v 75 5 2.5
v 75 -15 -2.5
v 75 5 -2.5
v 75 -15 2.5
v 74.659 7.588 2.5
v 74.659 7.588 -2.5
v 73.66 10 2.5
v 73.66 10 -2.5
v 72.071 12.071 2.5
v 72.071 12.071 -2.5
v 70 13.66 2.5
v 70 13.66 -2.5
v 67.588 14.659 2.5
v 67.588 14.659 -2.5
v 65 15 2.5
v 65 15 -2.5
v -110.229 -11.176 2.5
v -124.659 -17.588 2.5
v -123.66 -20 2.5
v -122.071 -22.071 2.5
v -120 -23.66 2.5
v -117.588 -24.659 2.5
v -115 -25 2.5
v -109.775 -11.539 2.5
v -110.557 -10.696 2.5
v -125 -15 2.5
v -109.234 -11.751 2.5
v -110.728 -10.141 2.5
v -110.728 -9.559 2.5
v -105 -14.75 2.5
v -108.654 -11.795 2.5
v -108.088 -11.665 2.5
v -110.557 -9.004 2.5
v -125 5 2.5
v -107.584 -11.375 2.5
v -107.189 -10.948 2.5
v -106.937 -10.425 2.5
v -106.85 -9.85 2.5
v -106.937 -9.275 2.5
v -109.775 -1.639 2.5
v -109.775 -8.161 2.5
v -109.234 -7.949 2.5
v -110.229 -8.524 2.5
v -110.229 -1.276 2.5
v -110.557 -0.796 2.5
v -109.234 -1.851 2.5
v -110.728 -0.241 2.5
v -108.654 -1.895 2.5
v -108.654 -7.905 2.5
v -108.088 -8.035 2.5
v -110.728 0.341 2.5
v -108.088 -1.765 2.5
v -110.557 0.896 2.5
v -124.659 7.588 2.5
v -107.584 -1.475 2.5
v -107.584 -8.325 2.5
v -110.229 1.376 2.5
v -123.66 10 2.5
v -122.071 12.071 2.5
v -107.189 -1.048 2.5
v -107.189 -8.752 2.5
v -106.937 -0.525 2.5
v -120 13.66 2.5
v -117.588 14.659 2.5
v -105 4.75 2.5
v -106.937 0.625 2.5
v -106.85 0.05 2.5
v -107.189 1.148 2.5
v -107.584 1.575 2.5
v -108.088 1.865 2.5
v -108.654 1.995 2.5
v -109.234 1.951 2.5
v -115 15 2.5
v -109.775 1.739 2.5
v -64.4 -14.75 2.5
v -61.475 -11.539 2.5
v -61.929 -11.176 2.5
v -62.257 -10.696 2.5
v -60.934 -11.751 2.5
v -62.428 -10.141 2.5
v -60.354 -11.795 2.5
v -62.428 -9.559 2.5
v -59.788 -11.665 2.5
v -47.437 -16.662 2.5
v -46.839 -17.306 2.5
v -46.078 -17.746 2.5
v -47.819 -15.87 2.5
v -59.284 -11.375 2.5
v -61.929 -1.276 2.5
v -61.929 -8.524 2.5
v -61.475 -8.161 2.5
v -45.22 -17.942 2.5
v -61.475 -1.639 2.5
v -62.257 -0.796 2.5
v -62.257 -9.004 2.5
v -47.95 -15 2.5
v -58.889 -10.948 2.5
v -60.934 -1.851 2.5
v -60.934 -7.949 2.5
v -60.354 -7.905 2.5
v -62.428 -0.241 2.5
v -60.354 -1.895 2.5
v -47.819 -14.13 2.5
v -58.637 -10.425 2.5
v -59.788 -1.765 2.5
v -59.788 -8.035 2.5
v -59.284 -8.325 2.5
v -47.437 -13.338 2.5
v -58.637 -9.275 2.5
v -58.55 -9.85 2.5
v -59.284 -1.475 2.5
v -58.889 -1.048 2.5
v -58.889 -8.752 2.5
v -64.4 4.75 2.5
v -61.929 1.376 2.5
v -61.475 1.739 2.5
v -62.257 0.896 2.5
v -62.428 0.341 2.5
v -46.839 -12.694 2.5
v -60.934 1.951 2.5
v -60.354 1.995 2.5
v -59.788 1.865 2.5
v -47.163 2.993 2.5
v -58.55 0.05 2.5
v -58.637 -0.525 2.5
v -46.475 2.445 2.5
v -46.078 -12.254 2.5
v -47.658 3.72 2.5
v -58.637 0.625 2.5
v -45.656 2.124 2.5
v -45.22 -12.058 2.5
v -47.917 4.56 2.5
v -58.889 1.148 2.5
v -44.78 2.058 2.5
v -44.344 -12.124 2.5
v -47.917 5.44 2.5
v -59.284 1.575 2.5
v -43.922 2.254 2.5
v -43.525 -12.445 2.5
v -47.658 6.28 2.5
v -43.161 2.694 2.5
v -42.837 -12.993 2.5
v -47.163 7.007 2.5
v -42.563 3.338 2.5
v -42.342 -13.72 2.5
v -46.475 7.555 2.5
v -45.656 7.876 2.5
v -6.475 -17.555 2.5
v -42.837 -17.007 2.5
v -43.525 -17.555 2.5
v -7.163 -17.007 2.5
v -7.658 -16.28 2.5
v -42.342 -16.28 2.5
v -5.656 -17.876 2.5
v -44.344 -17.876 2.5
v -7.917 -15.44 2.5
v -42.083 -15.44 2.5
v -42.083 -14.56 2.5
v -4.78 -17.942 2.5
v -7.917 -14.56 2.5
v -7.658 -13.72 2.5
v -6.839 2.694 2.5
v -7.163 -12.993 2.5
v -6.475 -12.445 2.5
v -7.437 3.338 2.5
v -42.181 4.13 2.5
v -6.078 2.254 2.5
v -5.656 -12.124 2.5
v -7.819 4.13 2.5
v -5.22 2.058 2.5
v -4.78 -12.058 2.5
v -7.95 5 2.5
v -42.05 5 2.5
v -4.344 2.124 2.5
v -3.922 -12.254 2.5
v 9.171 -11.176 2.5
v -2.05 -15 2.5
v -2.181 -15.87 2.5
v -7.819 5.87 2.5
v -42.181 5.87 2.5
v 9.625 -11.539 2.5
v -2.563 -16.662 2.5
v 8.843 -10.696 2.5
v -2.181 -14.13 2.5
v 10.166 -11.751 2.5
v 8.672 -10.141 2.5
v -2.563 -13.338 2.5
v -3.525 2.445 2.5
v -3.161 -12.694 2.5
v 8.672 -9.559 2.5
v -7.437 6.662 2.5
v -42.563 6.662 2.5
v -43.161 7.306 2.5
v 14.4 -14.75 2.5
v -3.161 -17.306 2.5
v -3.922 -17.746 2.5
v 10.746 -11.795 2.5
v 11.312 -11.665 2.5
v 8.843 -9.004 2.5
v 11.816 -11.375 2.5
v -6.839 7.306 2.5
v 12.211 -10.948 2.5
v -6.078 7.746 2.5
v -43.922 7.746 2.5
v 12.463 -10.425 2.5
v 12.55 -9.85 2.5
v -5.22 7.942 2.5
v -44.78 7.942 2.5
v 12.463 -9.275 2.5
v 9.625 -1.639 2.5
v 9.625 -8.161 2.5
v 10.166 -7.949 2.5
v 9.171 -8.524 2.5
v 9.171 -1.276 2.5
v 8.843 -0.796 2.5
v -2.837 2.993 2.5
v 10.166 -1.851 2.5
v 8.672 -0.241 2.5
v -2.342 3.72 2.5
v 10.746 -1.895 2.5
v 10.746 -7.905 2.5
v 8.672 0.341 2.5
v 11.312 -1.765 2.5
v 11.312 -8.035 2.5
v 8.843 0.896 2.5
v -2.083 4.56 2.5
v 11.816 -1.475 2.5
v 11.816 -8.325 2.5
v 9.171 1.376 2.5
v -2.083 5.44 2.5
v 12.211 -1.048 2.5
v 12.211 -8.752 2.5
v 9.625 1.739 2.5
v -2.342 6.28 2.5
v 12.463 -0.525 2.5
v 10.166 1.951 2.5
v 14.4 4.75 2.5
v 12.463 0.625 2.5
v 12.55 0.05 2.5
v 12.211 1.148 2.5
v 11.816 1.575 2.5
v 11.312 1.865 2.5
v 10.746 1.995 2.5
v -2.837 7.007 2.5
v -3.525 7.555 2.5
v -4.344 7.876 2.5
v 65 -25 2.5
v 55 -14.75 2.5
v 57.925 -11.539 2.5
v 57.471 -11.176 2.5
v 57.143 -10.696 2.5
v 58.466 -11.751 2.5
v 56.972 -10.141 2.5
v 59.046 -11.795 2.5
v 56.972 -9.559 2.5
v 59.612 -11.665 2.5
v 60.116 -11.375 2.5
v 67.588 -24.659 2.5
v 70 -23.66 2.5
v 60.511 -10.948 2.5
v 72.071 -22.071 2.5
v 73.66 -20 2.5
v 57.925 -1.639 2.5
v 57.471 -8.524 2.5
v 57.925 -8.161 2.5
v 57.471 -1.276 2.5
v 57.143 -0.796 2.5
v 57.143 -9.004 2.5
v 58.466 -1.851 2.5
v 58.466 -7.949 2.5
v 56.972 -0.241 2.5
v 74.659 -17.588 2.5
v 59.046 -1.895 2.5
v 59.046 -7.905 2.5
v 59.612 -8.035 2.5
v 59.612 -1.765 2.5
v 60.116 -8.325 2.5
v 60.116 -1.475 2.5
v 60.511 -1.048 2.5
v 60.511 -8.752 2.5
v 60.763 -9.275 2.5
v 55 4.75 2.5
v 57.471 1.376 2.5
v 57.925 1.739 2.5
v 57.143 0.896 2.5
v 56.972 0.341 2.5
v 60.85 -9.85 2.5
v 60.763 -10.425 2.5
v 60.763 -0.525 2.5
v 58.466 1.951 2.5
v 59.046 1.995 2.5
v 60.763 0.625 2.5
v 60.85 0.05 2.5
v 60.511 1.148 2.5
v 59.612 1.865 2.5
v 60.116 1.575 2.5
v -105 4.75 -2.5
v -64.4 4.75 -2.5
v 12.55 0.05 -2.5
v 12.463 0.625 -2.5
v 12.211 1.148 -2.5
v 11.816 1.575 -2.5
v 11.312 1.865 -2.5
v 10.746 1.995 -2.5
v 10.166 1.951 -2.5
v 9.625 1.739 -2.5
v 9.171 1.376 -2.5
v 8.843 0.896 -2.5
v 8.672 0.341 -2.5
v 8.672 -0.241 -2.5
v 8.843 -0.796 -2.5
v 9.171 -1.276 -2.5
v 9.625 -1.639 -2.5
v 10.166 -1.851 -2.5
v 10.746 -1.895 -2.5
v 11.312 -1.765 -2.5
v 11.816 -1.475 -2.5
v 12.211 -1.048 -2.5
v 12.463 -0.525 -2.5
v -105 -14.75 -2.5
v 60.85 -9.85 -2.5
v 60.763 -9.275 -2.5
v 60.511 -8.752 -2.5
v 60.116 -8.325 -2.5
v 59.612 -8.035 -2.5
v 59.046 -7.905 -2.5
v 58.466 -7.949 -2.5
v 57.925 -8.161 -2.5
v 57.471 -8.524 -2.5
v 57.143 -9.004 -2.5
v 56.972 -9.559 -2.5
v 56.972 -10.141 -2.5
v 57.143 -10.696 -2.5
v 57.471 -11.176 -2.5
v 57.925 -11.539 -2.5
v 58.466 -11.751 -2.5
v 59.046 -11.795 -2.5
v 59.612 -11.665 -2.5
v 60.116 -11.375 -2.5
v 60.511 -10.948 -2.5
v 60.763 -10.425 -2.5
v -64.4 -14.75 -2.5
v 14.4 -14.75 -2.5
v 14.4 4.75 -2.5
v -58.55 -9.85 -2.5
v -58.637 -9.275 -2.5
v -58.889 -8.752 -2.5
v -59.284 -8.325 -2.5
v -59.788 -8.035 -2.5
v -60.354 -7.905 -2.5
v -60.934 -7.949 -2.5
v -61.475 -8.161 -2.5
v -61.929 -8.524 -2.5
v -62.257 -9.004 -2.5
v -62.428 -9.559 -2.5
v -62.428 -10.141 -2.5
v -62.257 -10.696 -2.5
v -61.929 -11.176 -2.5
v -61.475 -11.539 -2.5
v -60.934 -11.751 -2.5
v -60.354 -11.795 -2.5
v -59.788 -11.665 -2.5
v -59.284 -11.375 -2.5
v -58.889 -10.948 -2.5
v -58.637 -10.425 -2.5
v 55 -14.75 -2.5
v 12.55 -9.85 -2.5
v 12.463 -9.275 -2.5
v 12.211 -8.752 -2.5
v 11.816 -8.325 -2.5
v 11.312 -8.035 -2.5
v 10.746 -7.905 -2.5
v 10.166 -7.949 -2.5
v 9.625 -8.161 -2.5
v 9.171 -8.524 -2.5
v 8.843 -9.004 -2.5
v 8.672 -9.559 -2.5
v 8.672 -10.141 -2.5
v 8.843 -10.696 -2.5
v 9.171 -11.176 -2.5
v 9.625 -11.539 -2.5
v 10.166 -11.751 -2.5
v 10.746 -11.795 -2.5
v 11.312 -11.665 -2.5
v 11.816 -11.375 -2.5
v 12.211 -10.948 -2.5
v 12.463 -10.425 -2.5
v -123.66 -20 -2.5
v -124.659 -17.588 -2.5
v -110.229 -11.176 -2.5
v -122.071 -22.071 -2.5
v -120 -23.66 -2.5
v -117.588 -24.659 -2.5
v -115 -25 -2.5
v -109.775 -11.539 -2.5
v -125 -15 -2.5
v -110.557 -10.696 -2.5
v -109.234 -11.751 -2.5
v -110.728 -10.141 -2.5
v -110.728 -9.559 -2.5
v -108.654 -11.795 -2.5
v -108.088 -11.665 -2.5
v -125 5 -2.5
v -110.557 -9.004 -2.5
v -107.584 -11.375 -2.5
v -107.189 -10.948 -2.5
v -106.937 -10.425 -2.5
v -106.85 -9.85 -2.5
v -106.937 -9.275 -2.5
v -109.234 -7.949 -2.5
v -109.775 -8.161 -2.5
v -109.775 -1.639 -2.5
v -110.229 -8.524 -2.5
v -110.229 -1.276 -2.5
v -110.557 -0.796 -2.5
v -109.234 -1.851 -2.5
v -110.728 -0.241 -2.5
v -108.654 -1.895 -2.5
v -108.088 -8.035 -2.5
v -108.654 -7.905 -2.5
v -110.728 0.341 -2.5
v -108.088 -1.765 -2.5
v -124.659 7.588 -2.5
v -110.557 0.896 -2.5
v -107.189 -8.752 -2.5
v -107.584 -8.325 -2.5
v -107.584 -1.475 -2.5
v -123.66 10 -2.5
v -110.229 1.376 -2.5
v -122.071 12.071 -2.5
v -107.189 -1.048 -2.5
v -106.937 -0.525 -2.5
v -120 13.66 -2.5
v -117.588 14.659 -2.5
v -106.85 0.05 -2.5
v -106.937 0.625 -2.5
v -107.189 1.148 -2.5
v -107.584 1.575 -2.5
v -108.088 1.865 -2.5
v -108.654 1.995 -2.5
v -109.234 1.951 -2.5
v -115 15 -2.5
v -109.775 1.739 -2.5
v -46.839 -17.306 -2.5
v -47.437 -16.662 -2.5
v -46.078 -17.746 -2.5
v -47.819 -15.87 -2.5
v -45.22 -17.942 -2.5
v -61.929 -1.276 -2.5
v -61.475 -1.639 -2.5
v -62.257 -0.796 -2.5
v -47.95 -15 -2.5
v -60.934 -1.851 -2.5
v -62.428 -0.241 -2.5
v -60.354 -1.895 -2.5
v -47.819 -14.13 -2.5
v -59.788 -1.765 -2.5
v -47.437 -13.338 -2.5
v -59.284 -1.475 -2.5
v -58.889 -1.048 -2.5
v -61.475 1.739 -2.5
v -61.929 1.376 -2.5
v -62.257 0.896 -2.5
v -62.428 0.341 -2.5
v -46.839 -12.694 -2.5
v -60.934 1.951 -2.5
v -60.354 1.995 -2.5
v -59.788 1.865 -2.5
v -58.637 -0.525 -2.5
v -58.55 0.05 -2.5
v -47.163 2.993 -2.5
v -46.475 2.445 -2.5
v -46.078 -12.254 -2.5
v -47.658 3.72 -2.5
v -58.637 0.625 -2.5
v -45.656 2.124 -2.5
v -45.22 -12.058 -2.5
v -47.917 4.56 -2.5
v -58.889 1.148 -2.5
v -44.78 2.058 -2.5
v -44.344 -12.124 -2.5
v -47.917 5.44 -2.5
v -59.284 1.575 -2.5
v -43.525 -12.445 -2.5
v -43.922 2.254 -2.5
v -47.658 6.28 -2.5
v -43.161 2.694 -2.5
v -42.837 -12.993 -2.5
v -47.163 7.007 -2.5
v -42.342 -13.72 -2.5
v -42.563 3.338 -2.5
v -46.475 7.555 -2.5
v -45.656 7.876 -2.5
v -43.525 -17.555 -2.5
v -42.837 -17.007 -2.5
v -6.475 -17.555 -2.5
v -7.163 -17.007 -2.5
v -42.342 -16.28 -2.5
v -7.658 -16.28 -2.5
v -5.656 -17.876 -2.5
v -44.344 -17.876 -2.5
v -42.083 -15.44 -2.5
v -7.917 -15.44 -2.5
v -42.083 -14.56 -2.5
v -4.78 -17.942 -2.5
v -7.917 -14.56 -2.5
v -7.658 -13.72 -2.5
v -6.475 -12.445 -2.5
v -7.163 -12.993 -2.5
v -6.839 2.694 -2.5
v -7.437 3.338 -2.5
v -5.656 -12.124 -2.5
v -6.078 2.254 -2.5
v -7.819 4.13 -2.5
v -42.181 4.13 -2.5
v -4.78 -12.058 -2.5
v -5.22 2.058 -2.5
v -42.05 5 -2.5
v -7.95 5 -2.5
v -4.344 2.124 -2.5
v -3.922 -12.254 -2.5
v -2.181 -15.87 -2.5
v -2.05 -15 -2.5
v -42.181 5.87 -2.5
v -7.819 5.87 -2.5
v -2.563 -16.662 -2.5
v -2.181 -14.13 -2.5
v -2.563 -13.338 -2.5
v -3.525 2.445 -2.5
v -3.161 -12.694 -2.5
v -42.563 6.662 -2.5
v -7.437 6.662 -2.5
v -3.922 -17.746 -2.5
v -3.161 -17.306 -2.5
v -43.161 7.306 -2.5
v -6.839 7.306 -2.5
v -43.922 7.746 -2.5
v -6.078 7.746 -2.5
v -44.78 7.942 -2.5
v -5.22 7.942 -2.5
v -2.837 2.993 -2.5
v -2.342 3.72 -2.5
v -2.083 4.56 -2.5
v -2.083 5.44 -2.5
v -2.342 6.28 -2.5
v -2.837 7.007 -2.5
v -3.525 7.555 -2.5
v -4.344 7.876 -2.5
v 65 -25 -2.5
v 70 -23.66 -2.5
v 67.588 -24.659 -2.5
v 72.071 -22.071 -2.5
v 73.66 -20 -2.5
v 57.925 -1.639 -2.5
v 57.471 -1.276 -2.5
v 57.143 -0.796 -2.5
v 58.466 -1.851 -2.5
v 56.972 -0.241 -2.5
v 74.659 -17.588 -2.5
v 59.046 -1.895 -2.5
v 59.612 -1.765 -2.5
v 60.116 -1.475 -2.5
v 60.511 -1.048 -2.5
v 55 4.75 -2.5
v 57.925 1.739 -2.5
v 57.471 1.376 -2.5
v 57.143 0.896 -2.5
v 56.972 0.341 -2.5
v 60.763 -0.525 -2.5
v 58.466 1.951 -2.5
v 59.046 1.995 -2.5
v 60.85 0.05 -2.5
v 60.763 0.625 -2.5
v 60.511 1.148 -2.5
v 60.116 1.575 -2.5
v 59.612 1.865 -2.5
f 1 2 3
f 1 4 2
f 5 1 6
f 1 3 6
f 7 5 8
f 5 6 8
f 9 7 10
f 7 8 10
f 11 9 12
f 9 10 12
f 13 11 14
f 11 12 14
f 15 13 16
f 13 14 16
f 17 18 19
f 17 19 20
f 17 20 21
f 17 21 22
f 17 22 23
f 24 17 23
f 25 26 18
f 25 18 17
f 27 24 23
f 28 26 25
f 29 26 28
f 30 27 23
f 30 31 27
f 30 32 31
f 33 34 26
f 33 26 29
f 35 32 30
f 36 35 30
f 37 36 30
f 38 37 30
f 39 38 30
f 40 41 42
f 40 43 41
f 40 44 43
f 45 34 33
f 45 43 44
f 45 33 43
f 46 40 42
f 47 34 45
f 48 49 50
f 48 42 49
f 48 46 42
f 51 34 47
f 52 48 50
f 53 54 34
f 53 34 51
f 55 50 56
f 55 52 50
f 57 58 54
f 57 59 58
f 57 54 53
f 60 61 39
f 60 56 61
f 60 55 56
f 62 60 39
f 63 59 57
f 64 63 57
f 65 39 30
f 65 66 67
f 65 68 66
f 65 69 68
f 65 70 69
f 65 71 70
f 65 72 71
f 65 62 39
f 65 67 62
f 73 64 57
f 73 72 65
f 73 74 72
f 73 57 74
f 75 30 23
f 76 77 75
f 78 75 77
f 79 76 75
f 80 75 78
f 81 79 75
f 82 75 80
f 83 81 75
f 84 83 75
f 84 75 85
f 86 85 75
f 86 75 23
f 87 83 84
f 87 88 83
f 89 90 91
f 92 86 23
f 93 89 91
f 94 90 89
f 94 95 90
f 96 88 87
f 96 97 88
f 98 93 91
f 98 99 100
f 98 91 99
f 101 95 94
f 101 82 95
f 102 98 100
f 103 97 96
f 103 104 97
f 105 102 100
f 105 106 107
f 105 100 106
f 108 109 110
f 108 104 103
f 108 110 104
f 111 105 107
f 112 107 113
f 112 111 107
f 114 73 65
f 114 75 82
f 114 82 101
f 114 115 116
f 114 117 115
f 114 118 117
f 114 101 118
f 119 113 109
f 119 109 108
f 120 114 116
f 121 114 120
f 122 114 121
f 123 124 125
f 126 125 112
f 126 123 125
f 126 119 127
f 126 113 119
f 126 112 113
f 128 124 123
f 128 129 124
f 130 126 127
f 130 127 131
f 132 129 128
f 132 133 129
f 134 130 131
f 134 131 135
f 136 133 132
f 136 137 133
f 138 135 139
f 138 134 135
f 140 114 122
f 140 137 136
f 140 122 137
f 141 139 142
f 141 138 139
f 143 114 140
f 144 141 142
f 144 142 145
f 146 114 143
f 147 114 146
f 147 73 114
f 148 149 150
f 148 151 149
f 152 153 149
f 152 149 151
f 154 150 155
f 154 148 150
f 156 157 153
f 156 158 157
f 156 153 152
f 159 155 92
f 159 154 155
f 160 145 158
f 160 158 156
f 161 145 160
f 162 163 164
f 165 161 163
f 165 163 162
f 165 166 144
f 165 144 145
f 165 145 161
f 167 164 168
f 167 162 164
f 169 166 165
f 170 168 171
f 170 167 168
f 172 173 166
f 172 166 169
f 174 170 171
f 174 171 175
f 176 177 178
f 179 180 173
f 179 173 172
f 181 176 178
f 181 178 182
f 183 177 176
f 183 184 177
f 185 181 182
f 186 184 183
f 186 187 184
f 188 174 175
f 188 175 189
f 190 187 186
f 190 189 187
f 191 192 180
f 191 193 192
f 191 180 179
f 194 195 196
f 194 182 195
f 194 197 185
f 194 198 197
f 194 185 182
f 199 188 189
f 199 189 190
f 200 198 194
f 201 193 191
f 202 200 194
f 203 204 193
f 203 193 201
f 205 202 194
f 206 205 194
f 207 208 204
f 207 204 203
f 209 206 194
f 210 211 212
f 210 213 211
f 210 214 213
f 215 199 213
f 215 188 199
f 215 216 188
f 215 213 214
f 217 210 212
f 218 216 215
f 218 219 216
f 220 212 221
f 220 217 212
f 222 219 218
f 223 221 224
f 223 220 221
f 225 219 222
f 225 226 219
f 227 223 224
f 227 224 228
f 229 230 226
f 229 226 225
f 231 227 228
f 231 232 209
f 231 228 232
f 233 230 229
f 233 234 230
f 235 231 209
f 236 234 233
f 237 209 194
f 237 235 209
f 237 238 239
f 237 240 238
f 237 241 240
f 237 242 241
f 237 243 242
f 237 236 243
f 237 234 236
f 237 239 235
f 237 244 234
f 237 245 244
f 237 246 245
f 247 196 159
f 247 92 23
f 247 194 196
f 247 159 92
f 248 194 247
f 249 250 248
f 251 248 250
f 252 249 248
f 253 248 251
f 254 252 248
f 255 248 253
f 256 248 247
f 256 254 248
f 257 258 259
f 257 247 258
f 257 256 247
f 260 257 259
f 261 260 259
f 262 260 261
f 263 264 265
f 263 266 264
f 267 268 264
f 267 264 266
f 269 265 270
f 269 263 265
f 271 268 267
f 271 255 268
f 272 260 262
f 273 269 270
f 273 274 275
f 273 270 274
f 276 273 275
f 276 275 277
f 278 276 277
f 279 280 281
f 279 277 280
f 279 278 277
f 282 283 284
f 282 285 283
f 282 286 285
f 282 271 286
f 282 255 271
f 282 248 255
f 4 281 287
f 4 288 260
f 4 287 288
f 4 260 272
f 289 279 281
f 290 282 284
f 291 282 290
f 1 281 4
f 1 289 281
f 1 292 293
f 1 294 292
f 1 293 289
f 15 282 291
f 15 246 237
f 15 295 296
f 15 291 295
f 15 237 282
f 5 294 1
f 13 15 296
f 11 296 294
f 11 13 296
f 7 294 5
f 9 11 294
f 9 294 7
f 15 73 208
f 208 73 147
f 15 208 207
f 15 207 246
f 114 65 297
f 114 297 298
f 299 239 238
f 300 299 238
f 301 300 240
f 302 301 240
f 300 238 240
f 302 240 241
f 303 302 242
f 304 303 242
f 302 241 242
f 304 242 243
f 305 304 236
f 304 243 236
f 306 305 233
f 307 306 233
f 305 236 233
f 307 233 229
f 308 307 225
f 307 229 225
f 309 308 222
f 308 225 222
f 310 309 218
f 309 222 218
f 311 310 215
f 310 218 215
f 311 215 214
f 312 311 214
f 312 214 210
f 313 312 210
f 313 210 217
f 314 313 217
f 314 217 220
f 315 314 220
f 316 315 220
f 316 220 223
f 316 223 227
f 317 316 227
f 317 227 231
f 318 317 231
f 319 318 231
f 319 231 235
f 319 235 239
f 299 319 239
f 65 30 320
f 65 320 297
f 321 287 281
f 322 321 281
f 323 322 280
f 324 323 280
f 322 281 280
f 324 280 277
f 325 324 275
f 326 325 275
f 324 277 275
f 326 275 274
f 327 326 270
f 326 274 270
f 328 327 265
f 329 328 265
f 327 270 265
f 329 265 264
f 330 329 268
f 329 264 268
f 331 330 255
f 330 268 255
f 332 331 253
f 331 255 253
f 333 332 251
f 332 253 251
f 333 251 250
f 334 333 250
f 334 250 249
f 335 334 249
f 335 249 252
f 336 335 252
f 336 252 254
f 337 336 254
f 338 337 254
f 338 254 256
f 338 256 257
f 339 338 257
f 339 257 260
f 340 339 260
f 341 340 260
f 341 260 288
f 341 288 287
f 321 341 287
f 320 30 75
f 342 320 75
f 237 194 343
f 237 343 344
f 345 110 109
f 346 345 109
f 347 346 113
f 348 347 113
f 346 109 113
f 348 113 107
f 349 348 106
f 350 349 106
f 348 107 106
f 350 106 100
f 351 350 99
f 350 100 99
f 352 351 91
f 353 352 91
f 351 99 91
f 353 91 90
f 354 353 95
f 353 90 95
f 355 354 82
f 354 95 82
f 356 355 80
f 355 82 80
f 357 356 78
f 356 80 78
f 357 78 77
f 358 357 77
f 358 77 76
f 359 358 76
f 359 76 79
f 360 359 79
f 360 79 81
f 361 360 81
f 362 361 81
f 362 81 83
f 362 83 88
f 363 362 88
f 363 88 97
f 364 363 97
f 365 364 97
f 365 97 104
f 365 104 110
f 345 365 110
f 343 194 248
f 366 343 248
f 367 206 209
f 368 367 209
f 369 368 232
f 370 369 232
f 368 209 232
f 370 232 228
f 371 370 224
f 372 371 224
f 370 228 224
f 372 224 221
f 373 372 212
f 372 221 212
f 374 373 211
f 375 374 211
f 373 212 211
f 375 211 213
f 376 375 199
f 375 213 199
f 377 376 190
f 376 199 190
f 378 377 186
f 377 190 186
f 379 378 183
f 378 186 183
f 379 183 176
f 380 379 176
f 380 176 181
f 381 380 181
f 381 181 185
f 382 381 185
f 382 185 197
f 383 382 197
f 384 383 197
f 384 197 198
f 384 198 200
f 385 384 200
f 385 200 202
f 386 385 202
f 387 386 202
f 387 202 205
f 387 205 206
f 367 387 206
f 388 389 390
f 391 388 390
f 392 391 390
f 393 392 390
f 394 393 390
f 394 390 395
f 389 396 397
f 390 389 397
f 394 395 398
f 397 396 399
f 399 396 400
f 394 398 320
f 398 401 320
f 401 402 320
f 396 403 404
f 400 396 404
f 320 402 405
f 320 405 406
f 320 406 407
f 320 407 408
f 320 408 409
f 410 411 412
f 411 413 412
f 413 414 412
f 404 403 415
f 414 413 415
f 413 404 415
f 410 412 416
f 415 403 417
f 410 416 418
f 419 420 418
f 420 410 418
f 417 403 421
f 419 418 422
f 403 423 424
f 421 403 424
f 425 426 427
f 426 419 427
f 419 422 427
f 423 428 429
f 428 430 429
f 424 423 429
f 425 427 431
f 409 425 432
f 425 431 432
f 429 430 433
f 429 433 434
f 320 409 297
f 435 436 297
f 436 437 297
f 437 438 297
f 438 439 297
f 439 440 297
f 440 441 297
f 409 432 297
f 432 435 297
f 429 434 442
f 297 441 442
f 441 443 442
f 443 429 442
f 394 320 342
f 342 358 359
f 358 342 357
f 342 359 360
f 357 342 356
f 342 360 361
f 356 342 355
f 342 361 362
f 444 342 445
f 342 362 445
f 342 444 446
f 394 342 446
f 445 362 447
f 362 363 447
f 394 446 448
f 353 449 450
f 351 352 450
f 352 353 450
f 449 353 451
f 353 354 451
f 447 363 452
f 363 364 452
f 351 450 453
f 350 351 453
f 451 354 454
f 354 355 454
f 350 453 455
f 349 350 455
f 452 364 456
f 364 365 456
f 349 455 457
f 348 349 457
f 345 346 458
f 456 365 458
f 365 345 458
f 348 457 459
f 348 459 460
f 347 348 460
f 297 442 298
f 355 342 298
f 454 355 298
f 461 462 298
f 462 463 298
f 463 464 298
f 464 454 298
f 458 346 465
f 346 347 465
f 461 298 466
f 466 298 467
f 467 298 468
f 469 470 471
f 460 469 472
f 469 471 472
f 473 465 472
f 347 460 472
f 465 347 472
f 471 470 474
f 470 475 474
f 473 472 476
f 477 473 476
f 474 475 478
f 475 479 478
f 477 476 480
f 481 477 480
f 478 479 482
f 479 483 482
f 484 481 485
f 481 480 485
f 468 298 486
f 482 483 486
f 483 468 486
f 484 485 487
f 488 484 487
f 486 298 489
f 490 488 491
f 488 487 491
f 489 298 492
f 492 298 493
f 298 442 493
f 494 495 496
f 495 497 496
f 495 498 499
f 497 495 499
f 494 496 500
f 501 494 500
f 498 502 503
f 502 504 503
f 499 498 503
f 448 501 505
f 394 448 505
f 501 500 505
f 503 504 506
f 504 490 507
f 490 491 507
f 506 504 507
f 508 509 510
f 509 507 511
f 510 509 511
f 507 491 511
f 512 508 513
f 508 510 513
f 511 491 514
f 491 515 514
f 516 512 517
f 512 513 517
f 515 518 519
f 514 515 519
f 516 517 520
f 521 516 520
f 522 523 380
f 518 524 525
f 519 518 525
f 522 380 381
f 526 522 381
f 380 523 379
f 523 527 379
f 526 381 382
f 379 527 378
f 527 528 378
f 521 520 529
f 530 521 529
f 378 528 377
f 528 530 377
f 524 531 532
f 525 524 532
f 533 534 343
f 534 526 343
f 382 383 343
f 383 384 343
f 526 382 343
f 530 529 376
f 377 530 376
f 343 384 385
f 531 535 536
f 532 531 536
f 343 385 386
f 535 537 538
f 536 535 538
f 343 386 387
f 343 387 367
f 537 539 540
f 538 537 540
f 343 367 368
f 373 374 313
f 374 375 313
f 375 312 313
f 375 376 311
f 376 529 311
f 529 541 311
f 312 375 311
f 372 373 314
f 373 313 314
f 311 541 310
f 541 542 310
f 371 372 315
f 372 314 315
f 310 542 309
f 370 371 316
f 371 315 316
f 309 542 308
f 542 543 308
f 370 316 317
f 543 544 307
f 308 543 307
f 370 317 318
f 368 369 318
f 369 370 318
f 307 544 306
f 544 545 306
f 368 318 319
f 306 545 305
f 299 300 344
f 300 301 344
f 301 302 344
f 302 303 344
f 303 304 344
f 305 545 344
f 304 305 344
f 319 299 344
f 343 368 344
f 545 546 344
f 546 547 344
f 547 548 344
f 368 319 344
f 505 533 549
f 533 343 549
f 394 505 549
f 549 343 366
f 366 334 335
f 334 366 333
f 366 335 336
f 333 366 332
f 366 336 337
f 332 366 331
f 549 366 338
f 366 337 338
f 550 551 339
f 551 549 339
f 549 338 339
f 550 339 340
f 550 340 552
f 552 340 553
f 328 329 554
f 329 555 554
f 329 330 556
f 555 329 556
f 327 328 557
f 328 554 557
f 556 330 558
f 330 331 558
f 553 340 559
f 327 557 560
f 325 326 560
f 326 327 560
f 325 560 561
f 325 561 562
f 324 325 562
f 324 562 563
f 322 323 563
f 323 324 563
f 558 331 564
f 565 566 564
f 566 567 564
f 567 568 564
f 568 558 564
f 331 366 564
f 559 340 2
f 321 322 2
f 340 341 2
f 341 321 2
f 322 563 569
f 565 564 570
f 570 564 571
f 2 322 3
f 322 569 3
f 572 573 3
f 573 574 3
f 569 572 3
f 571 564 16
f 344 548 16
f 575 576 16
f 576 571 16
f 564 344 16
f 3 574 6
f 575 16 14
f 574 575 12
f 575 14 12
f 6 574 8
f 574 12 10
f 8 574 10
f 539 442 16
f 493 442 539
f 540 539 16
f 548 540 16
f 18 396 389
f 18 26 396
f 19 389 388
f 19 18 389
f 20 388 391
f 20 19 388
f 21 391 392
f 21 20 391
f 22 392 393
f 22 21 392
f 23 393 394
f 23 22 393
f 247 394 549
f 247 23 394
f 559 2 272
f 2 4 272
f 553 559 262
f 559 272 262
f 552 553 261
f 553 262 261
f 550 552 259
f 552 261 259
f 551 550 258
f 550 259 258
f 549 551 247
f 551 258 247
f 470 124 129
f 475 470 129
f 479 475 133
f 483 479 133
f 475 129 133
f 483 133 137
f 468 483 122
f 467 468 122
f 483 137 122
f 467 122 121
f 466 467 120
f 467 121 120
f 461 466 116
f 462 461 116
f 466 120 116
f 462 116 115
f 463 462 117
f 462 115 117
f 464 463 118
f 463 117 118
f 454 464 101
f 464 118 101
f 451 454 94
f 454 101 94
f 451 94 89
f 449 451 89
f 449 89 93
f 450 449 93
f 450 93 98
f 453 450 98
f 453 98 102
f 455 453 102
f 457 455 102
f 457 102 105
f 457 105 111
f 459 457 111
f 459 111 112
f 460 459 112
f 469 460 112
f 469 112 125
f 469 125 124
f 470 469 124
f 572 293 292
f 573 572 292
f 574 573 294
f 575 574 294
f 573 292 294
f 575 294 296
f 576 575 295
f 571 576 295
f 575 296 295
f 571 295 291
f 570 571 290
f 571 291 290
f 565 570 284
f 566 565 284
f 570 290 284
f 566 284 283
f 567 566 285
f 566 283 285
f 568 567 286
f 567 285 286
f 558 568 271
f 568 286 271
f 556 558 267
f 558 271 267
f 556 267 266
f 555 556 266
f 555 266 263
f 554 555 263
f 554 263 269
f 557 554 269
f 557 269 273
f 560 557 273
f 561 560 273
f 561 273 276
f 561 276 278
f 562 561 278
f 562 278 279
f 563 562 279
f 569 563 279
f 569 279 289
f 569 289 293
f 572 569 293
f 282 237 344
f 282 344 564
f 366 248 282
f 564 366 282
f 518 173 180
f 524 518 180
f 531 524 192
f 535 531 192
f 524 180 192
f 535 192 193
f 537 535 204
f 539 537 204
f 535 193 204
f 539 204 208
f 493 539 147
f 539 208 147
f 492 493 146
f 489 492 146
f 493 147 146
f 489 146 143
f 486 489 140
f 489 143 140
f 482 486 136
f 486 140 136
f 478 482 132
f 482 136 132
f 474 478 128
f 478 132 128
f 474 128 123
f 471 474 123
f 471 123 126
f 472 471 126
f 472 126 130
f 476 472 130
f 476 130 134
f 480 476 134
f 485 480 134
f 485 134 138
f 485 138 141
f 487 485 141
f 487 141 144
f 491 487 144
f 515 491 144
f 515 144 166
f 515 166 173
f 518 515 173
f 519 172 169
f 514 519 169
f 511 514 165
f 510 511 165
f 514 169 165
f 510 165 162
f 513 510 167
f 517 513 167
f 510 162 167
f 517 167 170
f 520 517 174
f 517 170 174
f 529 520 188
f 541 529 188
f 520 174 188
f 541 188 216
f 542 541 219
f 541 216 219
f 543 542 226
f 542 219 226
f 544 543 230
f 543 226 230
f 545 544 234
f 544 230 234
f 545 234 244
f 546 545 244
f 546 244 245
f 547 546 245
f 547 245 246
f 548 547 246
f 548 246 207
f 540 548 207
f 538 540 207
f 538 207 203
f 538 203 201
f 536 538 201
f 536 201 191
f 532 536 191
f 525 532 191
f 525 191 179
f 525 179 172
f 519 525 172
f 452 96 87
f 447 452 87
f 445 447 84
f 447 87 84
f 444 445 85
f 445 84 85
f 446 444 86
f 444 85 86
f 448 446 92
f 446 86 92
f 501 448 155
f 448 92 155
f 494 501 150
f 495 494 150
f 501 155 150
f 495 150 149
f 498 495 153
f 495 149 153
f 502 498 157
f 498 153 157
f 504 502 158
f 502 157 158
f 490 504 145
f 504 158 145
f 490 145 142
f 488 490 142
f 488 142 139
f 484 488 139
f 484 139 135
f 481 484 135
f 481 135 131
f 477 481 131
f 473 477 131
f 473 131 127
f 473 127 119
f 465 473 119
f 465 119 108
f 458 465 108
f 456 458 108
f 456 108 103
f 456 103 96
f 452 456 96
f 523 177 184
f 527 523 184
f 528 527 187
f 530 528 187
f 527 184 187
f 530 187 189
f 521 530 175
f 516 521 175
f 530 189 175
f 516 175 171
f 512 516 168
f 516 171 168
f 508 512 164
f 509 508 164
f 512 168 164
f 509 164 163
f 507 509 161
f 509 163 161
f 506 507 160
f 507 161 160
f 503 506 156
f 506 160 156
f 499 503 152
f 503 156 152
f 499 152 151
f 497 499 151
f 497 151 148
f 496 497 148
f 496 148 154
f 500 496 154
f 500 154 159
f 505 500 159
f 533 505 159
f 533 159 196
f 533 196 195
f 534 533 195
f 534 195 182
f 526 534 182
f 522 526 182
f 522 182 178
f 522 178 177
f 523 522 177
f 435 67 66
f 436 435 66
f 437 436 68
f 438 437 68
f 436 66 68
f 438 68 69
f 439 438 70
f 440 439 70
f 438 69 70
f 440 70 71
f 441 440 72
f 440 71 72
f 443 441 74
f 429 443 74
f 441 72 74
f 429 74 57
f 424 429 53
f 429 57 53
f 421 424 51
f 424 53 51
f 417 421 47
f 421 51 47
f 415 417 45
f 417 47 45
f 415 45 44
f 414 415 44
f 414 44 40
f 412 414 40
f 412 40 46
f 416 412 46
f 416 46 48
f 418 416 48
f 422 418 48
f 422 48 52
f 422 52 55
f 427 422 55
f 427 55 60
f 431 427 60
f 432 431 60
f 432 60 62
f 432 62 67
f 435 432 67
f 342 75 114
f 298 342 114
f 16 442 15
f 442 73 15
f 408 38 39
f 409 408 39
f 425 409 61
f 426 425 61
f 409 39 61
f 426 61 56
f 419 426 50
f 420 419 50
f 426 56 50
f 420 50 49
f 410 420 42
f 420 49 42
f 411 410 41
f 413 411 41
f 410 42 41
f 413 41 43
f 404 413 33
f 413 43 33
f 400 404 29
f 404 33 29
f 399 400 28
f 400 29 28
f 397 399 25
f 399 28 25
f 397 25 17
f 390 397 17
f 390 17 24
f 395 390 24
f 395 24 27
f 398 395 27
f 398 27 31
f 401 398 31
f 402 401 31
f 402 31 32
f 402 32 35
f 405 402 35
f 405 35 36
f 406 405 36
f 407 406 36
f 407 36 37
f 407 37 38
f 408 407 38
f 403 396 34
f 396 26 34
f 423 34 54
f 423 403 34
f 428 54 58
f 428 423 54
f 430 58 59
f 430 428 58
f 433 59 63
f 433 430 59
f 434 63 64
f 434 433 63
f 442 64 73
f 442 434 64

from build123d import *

# Parameters (mm, degrees)
CROQUIS1_W            = 200
CROQUIS1_H            = 40
EXTRUIR1_DEPTH        = 2.5
REDONDEO1_R           = 10
CROQUIS3_W            = 40.6
CROQUIS3_H            = 19.5
EXTRUIR2_DEPTH        = 10
CROQUIS4_R            = 1.95
CORTAR_EXTRUIR1_DEPTH = 10
CROQUIS5_R            = 2.95
CORTAR_EXTRUIR3_DEPTH = 10


with BuildPart() as part:
    # Croquis1 → Extruir1 (new, symmetric)
    with BuildSketch(Plane.XY):
        with Locations((-25, -5)):
            Rectangle(CROQUIS1_W, CROQUIS1_H)
    extrude(amount=EXTRUIR1_DEPTH, both=True)

    # Redondeo1
    redondeo1_edges = [part.edges().sort_by_distance(p)[0] for p in [
        (75, 15, 0),
        (75, -25, 0),
        (-125, -25, 0),
        (-125, 15, 0),
    ]]
    fillet(redondeo1_edges, radius=REDONDEO1_R)

    # Croquis3 → Extruir2 (cut)
    with BuildSketch(Plane.XY.offset(2.5)):
        with Locations((34.7, -5)):
            Rectangle(CROQUIS3_W, CROQUIS3_H)
        with Locations((-84.7, -5)):
            Rectangle(CROQUIS3_W, CROQUIS3_H)
    extrude(amount=-EXTRUIR2_DEPTH, mode=Mode.SUBTRACT)

    # Croquis4 → Cortar-Extruir1 (cut)
    with BuildSketch(Plane.XY.offset(2.5)):
        with Locations((58.9, -9.85)):
            Circle(CROQUIS4_R)
        with Locations((58.9, 0.05)):
            Circle(CROQUIS4_R)
        with Locations((10.6, 0.05)):
            Circle(CROQUIS4_R)
        with Locations((10.6, -9.85)):
            Circle(CROQUIS4_R)
        with Locations((-108.8, -9.85)):
            Circle(CROQUIS4_R)
        with Locations((-108.8, 0.05)):
            Circle(CROQUIS4_R)
        with Locations((-60.5, 0.05)):
            Circle(CROQUIS4_R)
        with Locations((-60.5, -9.85)):
            Circle(CROQUIS4_R)
    extrude(amount=-CORTAR_EXTRUIR1_DEPTH, mode=Mode.SUBTRACT)

    # Croquis5 → Cortar-Extruir3 (cut)
    with BuildSketch(Plane.XY.offset(2.5)):
        with Locations((-45, 5)):
            Circle(CROQUIS5_R)
        with Locations(Location((-45, -15, 0), (0, 0, 180))):
            Circle(CROQUIS5_R)
        with Locations((-5, -15)):
            Circle(CROQUIS5_R)
        with Locations(Location((-5, 5, 0), (0, 0, 180))):
            Circle(CROQUIS5_R)
    extrude(amount=-CORTAR_EXTRUIR3_DEPTH, mode=Mode.SUBTRACT)


solid = part.part
